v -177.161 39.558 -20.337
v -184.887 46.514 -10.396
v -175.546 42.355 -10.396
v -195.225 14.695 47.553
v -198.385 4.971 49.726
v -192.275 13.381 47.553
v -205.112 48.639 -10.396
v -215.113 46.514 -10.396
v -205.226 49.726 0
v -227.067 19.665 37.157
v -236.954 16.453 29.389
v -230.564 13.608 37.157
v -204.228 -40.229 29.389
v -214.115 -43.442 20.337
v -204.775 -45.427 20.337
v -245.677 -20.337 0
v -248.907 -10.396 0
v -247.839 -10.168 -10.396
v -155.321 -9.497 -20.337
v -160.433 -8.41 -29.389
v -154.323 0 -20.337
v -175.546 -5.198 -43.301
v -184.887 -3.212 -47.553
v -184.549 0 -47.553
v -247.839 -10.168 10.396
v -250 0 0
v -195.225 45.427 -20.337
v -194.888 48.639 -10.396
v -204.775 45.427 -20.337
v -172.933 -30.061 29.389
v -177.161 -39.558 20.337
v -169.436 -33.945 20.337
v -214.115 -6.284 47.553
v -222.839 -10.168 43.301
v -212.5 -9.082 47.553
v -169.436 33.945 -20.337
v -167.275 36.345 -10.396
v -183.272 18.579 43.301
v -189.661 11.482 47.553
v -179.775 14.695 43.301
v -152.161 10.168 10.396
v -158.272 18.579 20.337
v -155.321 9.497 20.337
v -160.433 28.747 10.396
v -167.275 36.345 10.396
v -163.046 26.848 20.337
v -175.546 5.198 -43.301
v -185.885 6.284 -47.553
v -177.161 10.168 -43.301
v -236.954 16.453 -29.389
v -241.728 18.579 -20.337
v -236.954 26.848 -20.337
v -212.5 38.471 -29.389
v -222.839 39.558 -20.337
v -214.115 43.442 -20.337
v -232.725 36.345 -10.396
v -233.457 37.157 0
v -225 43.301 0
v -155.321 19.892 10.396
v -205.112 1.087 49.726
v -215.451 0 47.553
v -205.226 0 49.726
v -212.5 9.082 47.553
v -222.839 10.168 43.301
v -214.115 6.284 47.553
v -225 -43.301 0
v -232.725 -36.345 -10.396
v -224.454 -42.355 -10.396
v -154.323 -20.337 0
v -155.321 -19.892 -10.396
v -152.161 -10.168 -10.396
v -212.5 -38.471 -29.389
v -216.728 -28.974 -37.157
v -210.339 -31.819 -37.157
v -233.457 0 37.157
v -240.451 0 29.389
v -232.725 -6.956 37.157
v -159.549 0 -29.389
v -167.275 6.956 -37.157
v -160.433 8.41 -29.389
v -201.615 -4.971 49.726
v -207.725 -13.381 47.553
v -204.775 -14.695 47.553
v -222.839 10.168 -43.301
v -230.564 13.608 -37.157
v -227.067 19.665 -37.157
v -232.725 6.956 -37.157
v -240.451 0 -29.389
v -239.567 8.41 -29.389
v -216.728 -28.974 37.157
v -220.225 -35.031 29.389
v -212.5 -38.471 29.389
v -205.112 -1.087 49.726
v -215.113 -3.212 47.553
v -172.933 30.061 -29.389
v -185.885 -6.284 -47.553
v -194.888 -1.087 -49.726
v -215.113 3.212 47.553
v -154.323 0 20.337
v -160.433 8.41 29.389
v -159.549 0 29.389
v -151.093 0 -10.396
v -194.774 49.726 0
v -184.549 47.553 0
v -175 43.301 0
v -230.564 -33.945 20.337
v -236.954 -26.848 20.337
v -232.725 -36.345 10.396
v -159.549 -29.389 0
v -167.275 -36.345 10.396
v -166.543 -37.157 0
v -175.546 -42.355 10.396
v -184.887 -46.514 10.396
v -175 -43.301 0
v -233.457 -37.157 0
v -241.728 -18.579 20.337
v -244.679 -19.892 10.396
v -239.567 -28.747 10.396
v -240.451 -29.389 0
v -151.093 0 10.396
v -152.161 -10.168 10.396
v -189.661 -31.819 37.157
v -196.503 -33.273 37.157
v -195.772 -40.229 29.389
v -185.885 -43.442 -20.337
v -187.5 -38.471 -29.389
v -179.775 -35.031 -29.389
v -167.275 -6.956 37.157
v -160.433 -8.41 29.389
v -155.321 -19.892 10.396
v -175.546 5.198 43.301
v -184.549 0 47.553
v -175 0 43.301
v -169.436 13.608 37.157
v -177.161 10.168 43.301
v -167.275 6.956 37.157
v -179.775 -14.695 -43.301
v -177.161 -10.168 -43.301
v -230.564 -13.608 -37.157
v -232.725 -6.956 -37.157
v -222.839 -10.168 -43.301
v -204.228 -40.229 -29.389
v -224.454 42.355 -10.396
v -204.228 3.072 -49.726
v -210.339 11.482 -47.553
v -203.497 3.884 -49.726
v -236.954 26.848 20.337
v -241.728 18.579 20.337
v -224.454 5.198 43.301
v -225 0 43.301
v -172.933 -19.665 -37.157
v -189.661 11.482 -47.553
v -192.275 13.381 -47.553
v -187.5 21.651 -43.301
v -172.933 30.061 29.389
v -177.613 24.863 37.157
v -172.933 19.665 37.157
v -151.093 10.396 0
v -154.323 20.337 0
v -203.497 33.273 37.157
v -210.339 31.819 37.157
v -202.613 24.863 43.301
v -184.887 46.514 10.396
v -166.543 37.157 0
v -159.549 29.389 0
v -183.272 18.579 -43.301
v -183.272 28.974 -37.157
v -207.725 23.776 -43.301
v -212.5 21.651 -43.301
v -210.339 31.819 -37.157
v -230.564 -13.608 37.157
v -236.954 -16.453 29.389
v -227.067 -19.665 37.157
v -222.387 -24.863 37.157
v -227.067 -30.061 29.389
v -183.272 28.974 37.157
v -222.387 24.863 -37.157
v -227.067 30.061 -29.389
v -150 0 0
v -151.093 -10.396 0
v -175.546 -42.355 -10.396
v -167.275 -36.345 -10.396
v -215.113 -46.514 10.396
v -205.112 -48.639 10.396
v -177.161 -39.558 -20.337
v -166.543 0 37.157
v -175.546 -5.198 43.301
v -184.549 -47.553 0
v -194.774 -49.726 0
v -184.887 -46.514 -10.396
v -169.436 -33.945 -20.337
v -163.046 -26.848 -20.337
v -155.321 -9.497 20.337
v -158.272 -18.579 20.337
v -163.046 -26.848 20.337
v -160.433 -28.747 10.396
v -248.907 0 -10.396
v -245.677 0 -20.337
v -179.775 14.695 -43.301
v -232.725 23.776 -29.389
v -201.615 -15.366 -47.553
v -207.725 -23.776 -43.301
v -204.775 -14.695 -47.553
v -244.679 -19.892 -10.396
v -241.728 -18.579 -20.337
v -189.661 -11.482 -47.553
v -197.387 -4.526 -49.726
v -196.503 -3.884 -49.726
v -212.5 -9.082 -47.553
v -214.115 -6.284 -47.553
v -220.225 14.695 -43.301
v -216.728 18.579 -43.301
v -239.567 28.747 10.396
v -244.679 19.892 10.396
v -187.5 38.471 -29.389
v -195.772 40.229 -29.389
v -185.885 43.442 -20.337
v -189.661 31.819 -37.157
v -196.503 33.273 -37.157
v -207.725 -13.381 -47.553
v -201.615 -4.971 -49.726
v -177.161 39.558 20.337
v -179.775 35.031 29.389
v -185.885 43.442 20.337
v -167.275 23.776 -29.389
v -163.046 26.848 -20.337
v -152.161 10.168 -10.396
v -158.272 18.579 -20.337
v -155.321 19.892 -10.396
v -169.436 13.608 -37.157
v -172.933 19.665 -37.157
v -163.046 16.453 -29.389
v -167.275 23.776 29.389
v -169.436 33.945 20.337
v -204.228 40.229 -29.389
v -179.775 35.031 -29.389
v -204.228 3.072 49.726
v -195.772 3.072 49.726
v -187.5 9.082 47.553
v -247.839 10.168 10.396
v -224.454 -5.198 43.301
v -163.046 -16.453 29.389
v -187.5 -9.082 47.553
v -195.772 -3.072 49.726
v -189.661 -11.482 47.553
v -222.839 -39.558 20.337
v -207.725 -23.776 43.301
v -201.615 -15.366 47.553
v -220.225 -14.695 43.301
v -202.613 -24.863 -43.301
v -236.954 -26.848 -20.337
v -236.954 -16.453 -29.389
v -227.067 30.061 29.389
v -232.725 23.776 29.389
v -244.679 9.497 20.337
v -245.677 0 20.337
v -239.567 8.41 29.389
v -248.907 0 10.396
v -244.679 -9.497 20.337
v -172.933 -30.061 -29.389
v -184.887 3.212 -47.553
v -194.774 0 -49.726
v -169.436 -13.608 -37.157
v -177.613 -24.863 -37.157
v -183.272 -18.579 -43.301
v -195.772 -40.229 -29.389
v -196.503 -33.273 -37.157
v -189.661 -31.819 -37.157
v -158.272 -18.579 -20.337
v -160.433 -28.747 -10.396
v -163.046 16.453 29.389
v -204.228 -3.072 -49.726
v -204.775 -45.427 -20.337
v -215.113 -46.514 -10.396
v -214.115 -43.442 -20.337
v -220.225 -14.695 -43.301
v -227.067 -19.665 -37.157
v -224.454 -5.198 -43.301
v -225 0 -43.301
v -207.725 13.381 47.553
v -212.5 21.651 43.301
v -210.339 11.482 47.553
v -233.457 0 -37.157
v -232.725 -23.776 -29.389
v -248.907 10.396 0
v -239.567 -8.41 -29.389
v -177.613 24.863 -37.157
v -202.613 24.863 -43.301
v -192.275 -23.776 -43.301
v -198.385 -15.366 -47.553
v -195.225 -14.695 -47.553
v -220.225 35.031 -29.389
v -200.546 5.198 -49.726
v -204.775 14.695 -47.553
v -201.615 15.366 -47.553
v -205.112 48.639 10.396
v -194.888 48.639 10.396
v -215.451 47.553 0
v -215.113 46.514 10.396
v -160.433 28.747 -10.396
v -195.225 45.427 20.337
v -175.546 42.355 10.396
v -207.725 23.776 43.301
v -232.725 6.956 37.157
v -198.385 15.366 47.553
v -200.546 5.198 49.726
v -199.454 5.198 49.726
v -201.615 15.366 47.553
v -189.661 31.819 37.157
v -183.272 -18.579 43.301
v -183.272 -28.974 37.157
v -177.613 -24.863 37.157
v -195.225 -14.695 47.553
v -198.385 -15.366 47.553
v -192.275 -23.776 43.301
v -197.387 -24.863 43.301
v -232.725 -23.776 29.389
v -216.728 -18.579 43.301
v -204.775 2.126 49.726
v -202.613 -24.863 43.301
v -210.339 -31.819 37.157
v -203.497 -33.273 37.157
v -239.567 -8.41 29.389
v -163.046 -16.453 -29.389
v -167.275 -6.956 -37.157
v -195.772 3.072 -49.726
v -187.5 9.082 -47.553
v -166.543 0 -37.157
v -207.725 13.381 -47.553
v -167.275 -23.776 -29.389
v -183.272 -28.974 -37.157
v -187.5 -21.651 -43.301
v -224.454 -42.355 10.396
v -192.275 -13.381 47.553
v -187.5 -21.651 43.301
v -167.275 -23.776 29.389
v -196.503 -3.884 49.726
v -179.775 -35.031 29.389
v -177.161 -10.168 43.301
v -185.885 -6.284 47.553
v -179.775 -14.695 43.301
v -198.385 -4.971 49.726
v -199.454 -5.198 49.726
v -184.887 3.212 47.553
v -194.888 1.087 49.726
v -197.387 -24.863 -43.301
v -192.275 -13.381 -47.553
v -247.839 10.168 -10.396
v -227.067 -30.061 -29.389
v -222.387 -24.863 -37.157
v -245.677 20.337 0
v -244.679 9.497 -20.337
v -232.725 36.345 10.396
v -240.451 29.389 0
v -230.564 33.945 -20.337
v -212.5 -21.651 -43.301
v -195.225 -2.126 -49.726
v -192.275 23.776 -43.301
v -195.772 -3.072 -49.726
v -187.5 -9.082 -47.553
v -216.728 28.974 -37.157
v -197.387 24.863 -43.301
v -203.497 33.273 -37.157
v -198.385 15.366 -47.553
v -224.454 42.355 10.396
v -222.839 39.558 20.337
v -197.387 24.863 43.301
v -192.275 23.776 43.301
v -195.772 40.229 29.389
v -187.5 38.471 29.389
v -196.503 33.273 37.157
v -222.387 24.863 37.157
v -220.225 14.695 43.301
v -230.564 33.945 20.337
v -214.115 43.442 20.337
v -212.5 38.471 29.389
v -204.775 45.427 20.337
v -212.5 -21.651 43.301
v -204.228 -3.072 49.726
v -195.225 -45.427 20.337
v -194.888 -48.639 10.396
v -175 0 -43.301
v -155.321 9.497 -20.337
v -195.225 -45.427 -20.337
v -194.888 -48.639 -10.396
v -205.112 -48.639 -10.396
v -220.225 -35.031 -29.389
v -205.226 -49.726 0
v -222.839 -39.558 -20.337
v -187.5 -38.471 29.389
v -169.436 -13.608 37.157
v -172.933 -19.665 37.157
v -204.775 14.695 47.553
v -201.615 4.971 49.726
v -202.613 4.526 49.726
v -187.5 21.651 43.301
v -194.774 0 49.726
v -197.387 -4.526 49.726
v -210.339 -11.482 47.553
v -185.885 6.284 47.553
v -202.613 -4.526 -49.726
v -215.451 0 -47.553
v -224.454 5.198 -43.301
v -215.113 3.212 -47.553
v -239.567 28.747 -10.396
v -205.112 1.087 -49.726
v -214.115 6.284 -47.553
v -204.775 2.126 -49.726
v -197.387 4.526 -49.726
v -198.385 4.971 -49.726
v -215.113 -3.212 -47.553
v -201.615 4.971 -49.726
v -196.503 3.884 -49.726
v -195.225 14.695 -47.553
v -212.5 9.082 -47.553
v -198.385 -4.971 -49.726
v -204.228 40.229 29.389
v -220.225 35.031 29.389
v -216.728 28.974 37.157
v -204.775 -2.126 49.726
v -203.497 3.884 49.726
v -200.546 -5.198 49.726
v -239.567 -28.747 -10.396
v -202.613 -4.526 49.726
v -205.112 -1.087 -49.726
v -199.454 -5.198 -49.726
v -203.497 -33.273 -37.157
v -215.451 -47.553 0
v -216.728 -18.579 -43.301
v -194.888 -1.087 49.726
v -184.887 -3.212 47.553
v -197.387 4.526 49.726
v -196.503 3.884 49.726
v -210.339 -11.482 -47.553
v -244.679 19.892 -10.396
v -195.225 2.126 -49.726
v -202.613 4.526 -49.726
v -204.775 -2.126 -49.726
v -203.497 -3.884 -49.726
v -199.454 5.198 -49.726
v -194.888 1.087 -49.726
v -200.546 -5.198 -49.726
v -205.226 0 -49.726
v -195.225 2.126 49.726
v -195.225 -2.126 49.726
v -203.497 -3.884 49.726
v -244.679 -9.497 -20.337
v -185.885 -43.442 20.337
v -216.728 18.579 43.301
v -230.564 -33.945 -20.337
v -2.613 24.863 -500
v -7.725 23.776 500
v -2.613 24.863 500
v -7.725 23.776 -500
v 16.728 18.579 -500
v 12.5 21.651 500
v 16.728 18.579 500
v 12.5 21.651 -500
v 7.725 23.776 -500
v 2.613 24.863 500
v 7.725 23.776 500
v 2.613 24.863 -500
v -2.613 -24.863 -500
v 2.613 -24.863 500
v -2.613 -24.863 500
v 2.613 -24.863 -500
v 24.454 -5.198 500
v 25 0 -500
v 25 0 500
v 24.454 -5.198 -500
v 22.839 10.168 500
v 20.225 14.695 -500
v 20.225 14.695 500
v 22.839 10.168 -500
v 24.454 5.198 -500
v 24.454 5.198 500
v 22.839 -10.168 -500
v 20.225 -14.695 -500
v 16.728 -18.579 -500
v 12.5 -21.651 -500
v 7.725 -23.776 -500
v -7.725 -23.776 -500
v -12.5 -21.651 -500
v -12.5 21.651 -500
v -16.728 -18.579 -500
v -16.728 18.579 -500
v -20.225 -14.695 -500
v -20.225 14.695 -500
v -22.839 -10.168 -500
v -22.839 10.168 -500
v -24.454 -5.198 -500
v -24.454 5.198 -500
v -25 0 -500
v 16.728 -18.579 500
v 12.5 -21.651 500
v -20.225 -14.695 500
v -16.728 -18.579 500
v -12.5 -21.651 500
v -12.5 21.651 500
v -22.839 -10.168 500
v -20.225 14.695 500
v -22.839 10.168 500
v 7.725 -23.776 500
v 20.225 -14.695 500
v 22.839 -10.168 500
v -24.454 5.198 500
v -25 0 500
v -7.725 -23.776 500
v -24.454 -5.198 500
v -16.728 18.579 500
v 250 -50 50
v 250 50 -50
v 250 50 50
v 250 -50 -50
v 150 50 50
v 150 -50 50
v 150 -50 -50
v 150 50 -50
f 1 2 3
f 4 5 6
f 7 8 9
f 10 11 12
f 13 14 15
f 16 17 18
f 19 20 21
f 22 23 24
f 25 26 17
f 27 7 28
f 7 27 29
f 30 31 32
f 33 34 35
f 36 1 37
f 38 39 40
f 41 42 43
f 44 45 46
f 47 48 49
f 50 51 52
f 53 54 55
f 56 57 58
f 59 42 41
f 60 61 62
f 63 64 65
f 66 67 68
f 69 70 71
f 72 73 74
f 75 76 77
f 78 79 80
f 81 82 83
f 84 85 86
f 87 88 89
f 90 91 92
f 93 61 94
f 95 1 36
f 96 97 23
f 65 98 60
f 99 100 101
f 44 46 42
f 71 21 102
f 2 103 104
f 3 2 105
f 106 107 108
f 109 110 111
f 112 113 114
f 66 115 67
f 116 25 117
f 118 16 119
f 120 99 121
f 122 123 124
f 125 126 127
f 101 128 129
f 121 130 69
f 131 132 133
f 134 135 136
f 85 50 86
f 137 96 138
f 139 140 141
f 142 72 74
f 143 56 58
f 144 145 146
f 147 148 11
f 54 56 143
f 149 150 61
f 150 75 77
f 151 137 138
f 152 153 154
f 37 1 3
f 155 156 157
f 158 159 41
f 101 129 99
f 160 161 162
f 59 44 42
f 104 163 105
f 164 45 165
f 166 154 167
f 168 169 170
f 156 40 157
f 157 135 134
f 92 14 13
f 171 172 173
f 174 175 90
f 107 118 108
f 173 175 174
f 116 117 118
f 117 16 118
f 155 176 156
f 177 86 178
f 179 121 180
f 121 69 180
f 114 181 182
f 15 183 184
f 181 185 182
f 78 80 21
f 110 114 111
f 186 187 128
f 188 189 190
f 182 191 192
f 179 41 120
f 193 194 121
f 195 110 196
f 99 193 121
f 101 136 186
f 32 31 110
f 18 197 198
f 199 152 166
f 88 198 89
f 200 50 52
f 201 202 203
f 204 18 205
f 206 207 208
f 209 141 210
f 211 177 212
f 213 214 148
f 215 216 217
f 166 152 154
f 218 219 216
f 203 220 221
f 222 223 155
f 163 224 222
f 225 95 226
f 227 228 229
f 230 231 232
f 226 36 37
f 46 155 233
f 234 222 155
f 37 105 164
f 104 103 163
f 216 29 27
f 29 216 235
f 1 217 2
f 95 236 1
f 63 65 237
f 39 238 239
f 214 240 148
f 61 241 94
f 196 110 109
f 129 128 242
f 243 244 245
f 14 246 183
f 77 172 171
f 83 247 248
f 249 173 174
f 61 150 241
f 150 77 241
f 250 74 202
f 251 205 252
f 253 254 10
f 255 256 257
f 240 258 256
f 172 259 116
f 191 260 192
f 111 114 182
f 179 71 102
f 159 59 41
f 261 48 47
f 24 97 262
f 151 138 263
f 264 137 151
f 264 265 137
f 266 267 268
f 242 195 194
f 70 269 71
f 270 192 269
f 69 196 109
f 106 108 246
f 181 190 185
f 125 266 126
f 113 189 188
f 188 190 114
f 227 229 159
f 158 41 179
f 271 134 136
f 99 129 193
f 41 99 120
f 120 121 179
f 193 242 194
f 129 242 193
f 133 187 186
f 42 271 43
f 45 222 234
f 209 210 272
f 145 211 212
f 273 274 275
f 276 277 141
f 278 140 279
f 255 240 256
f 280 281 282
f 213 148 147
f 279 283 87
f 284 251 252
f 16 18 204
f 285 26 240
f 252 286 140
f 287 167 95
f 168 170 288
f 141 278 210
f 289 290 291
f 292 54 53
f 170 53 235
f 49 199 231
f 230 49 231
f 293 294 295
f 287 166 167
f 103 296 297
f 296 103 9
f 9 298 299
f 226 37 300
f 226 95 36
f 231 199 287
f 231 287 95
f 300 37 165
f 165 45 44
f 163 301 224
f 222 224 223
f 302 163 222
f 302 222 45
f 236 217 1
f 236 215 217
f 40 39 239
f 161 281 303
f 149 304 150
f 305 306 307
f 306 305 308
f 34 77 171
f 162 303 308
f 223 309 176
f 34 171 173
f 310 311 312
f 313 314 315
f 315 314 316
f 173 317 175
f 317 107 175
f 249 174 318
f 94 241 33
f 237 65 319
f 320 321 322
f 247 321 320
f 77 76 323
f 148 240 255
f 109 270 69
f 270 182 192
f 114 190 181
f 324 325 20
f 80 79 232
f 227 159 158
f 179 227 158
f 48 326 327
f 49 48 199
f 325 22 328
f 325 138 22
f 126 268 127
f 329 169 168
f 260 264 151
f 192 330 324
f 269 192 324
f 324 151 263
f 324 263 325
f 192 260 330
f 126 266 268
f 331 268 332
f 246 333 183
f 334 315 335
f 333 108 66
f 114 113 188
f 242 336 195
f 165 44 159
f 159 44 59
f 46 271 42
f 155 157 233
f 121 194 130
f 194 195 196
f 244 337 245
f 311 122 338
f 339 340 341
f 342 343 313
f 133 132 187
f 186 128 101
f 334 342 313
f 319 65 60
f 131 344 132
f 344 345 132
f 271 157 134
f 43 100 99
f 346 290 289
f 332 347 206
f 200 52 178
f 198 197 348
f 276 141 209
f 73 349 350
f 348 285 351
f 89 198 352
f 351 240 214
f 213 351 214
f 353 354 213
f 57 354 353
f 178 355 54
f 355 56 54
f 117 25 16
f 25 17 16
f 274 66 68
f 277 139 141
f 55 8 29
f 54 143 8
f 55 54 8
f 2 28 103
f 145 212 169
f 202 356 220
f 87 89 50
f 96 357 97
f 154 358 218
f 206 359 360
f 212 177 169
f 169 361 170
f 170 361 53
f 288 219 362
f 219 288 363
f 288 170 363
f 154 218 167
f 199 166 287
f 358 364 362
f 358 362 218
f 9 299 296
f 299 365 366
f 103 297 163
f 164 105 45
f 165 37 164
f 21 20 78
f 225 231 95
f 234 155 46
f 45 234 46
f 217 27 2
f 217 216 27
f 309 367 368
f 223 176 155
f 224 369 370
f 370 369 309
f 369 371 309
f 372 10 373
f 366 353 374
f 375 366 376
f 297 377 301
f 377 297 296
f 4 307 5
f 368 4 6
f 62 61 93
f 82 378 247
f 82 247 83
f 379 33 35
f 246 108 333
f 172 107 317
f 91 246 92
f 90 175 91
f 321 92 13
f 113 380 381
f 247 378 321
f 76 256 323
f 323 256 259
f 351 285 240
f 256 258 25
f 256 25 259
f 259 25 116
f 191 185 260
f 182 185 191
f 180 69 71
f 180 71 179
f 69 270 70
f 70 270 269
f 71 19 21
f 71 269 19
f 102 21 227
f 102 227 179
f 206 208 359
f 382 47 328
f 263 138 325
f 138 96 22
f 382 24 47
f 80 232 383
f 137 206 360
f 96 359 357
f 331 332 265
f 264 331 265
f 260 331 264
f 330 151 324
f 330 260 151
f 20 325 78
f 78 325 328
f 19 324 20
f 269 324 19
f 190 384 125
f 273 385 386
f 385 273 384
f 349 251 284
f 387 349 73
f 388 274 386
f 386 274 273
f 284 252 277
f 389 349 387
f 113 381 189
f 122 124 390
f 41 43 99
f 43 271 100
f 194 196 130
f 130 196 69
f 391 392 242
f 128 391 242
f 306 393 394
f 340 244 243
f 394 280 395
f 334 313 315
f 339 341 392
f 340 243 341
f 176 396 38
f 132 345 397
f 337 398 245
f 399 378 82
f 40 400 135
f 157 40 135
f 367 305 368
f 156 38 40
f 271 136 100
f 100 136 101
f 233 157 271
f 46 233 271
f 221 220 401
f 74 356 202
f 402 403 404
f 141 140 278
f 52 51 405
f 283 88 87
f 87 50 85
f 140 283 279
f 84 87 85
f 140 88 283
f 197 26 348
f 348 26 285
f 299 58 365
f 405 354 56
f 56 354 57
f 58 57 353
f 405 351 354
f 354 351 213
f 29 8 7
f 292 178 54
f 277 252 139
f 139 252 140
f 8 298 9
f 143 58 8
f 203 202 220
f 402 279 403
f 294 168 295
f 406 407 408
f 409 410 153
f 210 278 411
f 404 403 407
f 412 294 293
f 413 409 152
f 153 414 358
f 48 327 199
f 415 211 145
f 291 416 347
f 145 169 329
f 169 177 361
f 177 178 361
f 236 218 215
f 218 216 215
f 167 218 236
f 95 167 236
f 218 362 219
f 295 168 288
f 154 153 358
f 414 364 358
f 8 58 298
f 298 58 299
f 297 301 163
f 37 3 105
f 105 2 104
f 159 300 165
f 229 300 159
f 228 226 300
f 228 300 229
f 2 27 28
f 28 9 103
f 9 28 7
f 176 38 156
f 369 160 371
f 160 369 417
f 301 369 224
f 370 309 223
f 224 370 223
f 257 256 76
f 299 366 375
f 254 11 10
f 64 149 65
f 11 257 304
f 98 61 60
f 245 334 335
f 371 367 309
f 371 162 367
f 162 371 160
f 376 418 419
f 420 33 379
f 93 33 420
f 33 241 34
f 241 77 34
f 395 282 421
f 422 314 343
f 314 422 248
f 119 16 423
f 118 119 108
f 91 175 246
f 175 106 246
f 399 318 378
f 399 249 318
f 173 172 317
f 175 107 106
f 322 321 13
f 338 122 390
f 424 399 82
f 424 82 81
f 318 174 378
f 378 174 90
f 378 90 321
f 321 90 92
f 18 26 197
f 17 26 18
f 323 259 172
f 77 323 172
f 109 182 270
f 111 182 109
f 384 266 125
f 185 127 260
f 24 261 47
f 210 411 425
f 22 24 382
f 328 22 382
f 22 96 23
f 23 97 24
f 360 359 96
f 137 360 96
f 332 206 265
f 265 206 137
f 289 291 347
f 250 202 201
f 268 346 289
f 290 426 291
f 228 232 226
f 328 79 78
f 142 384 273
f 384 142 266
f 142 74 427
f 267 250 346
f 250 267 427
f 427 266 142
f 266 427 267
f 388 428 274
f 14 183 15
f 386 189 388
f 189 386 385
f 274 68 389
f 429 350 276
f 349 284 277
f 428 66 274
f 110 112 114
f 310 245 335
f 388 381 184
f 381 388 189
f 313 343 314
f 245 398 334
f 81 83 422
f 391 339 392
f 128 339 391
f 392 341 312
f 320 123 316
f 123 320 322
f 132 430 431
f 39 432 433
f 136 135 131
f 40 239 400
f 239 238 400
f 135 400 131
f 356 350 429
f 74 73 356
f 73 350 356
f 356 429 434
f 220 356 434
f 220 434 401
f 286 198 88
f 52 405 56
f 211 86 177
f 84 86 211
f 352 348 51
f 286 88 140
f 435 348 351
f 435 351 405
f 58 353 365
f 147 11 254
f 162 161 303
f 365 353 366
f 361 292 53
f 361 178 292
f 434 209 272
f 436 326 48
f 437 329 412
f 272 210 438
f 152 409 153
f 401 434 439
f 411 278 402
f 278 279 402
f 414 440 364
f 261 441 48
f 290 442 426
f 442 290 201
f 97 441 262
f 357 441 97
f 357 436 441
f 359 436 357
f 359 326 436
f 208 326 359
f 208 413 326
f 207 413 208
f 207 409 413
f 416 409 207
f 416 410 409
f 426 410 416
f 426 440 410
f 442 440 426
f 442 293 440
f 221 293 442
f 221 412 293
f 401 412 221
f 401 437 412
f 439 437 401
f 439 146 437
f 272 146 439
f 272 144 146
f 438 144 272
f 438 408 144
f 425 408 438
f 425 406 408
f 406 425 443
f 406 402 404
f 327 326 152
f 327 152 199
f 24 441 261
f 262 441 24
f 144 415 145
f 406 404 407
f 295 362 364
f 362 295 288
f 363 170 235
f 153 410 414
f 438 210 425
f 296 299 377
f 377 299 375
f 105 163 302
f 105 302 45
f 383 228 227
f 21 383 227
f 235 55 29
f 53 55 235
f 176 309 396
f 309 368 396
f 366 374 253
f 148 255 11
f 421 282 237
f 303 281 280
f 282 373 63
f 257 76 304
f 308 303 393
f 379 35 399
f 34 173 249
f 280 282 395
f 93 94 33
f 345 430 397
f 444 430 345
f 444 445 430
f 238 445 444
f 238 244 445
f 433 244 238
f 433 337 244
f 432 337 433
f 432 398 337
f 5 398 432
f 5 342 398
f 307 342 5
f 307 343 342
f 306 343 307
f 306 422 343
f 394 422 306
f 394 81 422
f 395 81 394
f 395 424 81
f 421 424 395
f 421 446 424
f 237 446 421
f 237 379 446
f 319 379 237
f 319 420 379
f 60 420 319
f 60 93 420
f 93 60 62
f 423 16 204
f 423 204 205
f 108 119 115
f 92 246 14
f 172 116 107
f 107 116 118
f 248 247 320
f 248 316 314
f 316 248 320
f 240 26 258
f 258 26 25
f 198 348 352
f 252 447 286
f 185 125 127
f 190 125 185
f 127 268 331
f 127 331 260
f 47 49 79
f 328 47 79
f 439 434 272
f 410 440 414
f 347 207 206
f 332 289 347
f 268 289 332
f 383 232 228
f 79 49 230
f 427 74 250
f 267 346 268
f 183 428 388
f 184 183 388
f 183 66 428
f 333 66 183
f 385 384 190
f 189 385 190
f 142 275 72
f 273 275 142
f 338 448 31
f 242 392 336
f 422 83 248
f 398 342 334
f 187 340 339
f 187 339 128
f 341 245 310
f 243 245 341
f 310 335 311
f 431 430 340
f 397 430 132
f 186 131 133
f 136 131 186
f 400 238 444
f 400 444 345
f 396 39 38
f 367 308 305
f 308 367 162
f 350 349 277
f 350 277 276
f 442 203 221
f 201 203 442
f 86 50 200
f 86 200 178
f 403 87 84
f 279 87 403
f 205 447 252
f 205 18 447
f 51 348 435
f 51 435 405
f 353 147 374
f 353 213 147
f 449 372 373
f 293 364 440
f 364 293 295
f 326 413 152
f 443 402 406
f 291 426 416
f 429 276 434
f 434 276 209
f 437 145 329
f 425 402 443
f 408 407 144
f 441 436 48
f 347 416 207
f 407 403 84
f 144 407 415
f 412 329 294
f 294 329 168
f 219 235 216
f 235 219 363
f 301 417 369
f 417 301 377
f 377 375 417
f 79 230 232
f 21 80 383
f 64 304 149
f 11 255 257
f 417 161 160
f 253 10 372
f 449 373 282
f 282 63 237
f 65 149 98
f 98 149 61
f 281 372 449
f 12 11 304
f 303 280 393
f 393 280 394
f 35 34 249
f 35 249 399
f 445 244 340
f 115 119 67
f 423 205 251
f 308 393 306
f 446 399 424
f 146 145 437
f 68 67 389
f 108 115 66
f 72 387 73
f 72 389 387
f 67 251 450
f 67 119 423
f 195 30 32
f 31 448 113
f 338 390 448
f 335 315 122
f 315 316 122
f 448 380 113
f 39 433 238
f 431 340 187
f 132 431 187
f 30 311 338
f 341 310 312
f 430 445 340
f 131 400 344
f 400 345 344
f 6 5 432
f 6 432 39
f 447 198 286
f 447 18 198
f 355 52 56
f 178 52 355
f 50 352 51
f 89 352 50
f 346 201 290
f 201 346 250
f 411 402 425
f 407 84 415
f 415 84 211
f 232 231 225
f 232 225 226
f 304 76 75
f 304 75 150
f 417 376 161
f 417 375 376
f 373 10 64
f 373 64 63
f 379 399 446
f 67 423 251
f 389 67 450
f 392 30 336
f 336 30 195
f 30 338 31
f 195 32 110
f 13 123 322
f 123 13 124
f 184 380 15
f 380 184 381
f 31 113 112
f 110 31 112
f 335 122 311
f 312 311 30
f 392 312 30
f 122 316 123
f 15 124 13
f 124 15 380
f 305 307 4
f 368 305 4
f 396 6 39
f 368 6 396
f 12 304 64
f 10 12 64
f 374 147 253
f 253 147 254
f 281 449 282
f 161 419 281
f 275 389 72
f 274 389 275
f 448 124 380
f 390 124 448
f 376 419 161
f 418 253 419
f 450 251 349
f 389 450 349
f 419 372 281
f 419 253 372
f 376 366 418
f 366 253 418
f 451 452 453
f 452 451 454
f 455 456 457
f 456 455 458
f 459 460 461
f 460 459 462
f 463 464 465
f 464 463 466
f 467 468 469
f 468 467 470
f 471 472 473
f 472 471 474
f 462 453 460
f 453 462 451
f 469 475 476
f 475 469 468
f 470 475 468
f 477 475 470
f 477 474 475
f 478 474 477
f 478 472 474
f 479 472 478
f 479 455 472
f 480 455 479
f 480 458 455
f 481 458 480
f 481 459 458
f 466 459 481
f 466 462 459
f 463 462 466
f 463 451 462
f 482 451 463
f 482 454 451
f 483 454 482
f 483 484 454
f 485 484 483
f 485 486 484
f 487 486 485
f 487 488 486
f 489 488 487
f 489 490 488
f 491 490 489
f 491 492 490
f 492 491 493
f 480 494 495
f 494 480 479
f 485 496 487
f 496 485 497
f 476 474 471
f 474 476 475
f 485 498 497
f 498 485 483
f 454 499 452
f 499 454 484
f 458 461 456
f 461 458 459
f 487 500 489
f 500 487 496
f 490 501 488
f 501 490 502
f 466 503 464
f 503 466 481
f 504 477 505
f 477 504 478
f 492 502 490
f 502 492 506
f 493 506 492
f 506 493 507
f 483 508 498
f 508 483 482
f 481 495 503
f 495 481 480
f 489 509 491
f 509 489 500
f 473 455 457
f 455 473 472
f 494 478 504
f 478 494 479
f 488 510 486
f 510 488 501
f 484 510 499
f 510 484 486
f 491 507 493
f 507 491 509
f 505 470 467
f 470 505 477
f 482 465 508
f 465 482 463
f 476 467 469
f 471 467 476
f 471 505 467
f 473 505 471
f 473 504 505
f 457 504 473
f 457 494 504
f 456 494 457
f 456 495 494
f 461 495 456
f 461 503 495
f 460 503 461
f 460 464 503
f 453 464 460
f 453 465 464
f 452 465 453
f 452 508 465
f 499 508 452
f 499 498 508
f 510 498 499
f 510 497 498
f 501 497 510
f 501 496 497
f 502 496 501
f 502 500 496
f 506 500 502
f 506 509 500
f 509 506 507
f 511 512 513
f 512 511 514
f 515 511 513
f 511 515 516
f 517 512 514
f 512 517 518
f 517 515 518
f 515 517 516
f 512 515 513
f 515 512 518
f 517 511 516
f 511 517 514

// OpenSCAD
// Units: millimeters (OpenSCAD defaults to mm)

sphere_r = 50;      // 5 cm
cyl_dia  = 50;      // 5 cm
cyl_h    = 1000;    // 100 cm
cube_side = 100;    // 10 cm

// Arrange objects side by side for clarity
translate([-200, 0, 0])  // move left
    sphere(r = sphere_r);

translate([0, 0, 0])     // center
    cylinder(d = cyl_dia, h = cyl_h, center = true);

translate([200, 0, 0])   // move right
    cube([cube_side, cube_side, cube_side], center = true);
